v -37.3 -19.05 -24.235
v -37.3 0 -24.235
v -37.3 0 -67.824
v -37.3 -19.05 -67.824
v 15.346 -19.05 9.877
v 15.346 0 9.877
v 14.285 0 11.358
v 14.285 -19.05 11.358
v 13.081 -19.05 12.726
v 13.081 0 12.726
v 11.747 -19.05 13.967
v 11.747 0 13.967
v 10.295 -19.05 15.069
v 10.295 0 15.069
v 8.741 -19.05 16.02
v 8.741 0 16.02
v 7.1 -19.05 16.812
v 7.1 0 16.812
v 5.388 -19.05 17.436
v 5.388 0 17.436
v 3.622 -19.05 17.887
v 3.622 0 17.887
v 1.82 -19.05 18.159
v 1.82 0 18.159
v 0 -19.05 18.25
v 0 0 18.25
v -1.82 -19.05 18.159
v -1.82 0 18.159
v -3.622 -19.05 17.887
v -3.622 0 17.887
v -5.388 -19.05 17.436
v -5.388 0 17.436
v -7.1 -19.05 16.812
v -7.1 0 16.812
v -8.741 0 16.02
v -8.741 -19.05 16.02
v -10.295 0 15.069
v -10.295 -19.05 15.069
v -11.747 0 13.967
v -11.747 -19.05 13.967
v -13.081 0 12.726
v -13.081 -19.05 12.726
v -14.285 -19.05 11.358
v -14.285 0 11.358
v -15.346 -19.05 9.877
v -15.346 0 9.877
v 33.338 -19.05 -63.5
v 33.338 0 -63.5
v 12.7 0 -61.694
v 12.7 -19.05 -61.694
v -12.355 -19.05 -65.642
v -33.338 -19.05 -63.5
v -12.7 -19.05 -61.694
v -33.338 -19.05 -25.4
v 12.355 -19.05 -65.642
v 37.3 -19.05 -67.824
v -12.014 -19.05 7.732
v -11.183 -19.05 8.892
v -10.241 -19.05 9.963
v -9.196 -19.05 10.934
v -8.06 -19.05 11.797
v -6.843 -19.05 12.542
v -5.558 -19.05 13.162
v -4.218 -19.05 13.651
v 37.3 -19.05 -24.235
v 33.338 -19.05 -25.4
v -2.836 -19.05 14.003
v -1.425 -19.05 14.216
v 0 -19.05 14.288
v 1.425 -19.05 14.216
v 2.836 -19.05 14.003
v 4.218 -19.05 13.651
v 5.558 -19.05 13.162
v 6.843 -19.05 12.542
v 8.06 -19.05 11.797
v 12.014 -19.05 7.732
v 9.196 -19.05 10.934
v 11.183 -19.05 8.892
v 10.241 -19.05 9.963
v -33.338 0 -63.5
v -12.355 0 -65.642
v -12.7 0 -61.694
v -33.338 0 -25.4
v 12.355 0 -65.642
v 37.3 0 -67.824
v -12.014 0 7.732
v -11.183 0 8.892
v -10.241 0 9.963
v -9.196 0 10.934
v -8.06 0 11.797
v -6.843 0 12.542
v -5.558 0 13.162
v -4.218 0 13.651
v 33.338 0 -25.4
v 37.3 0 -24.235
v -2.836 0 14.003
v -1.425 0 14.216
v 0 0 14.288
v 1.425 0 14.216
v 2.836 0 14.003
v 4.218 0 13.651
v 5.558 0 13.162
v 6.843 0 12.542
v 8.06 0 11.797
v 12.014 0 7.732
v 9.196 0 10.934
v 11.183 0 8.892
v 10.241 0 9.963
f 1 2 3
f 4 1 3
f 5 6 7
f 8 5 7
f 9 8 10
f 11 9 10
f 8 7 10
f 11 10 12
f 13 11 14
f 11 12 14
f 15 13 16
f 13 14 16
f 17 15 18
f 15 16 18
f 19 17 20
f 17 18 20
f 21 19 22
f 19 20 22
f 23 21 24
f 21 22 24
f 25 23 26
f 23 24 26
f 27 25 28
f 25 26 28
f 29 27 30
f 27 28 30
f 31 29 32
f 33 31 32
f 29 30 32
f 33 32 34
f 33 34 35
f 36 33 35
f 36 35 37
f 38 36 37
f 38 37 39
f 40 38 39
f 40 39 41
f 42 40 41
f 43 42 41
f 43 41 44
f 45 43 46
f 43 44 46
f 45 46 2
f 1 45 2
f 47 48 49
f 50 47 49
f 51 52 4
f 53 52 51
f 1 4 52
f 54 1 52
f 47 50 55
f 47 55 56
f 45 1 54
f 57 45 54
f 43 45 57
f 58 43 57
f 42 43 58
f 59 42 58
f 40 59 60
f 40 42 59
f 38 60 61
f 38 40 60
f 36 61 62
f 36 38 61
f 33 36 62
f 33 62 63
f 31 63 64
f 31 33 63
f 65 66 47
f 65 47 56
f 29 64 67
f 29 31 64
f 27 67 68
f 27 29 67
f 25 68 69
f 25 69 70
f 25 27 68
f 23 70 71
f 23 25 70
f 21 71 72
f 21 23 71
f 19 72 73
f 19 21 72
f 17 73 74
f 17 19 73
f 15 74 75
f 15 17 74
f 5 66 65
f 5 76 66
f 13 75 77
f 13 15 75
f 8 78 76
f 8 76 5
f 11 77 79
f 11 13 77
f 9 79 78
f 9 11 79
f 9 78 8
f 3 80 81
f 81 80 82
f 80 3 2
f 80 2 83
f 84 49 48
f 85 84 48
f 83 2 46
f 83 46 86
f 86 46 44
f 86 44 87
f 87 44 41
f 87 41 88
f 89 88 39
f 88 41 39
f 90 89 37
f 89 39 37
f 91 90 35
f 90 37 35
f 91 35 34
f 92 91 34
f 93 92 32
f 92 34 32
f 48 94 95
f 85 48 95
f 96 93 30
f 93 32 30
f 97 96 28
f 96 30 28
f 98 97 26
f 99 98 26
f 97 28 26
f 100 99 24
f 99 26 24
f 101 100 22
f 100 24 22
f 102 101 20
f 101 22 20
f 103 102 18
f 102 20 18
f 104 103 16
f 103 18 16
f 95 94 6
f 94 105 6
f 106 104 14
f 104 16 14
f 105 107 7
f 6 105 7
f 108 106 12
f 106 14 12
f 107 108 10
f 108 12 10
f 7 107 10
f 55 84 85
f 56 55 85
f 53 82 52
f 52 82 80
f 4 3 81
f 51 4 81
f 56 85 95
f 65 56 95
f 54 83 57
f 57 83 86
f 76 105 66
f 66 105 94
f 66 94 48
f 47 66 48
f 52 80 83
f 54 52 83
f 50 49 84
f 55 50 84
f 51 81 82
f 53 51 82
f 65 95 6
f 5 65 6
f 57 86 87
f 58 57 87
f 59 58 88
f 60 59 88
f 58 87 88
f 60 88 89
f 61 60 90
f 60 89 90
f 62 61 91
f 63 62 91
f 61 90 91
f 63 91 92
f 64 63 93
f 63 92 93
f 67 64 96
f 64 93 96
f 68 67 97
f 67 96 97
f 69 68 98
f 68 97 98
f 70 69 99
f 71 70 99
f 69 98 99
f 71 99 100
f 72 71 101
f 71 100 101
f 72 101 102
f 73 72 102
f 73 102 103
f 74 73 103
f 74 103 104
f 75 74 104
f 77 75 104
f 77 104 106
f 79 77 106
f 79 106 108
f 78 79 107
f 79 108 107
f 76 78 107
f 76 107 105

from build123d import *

# Parameters (mm, degrees)
F1_DEPTH = 19.05


with BuildPart() as f1:
    # F0 (on Front) → F1 (new body)
    with BuildSketch(Plane.XZ):
        with BuildLine():
            ThreePointArc((-12.014405, 7.732188), (0, 14.2875), (12.014405, 7.732188))
            Line((12.014405, 7.732188), (33.3375, -25.4))
            Line((33.3375, -25.4), (33.3375, -63.5))
            Line((33.3375, -63.5), (12.7, -61.694453))
            Line((12.7, -61.694453), (12.354654, -65.641775))
            Line((12.354654, -65.641775), (37.2999, -67.824201))
            Line((37.2999, -67.824201), (37.2999, -24.235141))
            Line((37.2999, -24.235141), (15.3464, 9.876581))
            ThreePointArc((15.3464, 9.876581), (0, 18.2499), (-15.3464, 9.876581))
            Line((-15.3464, 9.876581), (-37.2999, -24.235141))
            Line((-37.2999, -24.235141), (-37.2999, -67.824201))
            Line((-37.2999, -67.824201), (-12.354654, -65.641775))
            Line((-12.354654, -65.641775), (-12.7, -61.694453))
            Line((-12.7, -61.694453), (-33.3375, -63.5))
            Line((-33.3375, -63.5), (-33.3375, -25.4))
            Line((-33.3375, -25.4), (-12.014405, 7.732188))
        make_face()
    extrude(amount=F1_DEPTH)


solid = f1.part
